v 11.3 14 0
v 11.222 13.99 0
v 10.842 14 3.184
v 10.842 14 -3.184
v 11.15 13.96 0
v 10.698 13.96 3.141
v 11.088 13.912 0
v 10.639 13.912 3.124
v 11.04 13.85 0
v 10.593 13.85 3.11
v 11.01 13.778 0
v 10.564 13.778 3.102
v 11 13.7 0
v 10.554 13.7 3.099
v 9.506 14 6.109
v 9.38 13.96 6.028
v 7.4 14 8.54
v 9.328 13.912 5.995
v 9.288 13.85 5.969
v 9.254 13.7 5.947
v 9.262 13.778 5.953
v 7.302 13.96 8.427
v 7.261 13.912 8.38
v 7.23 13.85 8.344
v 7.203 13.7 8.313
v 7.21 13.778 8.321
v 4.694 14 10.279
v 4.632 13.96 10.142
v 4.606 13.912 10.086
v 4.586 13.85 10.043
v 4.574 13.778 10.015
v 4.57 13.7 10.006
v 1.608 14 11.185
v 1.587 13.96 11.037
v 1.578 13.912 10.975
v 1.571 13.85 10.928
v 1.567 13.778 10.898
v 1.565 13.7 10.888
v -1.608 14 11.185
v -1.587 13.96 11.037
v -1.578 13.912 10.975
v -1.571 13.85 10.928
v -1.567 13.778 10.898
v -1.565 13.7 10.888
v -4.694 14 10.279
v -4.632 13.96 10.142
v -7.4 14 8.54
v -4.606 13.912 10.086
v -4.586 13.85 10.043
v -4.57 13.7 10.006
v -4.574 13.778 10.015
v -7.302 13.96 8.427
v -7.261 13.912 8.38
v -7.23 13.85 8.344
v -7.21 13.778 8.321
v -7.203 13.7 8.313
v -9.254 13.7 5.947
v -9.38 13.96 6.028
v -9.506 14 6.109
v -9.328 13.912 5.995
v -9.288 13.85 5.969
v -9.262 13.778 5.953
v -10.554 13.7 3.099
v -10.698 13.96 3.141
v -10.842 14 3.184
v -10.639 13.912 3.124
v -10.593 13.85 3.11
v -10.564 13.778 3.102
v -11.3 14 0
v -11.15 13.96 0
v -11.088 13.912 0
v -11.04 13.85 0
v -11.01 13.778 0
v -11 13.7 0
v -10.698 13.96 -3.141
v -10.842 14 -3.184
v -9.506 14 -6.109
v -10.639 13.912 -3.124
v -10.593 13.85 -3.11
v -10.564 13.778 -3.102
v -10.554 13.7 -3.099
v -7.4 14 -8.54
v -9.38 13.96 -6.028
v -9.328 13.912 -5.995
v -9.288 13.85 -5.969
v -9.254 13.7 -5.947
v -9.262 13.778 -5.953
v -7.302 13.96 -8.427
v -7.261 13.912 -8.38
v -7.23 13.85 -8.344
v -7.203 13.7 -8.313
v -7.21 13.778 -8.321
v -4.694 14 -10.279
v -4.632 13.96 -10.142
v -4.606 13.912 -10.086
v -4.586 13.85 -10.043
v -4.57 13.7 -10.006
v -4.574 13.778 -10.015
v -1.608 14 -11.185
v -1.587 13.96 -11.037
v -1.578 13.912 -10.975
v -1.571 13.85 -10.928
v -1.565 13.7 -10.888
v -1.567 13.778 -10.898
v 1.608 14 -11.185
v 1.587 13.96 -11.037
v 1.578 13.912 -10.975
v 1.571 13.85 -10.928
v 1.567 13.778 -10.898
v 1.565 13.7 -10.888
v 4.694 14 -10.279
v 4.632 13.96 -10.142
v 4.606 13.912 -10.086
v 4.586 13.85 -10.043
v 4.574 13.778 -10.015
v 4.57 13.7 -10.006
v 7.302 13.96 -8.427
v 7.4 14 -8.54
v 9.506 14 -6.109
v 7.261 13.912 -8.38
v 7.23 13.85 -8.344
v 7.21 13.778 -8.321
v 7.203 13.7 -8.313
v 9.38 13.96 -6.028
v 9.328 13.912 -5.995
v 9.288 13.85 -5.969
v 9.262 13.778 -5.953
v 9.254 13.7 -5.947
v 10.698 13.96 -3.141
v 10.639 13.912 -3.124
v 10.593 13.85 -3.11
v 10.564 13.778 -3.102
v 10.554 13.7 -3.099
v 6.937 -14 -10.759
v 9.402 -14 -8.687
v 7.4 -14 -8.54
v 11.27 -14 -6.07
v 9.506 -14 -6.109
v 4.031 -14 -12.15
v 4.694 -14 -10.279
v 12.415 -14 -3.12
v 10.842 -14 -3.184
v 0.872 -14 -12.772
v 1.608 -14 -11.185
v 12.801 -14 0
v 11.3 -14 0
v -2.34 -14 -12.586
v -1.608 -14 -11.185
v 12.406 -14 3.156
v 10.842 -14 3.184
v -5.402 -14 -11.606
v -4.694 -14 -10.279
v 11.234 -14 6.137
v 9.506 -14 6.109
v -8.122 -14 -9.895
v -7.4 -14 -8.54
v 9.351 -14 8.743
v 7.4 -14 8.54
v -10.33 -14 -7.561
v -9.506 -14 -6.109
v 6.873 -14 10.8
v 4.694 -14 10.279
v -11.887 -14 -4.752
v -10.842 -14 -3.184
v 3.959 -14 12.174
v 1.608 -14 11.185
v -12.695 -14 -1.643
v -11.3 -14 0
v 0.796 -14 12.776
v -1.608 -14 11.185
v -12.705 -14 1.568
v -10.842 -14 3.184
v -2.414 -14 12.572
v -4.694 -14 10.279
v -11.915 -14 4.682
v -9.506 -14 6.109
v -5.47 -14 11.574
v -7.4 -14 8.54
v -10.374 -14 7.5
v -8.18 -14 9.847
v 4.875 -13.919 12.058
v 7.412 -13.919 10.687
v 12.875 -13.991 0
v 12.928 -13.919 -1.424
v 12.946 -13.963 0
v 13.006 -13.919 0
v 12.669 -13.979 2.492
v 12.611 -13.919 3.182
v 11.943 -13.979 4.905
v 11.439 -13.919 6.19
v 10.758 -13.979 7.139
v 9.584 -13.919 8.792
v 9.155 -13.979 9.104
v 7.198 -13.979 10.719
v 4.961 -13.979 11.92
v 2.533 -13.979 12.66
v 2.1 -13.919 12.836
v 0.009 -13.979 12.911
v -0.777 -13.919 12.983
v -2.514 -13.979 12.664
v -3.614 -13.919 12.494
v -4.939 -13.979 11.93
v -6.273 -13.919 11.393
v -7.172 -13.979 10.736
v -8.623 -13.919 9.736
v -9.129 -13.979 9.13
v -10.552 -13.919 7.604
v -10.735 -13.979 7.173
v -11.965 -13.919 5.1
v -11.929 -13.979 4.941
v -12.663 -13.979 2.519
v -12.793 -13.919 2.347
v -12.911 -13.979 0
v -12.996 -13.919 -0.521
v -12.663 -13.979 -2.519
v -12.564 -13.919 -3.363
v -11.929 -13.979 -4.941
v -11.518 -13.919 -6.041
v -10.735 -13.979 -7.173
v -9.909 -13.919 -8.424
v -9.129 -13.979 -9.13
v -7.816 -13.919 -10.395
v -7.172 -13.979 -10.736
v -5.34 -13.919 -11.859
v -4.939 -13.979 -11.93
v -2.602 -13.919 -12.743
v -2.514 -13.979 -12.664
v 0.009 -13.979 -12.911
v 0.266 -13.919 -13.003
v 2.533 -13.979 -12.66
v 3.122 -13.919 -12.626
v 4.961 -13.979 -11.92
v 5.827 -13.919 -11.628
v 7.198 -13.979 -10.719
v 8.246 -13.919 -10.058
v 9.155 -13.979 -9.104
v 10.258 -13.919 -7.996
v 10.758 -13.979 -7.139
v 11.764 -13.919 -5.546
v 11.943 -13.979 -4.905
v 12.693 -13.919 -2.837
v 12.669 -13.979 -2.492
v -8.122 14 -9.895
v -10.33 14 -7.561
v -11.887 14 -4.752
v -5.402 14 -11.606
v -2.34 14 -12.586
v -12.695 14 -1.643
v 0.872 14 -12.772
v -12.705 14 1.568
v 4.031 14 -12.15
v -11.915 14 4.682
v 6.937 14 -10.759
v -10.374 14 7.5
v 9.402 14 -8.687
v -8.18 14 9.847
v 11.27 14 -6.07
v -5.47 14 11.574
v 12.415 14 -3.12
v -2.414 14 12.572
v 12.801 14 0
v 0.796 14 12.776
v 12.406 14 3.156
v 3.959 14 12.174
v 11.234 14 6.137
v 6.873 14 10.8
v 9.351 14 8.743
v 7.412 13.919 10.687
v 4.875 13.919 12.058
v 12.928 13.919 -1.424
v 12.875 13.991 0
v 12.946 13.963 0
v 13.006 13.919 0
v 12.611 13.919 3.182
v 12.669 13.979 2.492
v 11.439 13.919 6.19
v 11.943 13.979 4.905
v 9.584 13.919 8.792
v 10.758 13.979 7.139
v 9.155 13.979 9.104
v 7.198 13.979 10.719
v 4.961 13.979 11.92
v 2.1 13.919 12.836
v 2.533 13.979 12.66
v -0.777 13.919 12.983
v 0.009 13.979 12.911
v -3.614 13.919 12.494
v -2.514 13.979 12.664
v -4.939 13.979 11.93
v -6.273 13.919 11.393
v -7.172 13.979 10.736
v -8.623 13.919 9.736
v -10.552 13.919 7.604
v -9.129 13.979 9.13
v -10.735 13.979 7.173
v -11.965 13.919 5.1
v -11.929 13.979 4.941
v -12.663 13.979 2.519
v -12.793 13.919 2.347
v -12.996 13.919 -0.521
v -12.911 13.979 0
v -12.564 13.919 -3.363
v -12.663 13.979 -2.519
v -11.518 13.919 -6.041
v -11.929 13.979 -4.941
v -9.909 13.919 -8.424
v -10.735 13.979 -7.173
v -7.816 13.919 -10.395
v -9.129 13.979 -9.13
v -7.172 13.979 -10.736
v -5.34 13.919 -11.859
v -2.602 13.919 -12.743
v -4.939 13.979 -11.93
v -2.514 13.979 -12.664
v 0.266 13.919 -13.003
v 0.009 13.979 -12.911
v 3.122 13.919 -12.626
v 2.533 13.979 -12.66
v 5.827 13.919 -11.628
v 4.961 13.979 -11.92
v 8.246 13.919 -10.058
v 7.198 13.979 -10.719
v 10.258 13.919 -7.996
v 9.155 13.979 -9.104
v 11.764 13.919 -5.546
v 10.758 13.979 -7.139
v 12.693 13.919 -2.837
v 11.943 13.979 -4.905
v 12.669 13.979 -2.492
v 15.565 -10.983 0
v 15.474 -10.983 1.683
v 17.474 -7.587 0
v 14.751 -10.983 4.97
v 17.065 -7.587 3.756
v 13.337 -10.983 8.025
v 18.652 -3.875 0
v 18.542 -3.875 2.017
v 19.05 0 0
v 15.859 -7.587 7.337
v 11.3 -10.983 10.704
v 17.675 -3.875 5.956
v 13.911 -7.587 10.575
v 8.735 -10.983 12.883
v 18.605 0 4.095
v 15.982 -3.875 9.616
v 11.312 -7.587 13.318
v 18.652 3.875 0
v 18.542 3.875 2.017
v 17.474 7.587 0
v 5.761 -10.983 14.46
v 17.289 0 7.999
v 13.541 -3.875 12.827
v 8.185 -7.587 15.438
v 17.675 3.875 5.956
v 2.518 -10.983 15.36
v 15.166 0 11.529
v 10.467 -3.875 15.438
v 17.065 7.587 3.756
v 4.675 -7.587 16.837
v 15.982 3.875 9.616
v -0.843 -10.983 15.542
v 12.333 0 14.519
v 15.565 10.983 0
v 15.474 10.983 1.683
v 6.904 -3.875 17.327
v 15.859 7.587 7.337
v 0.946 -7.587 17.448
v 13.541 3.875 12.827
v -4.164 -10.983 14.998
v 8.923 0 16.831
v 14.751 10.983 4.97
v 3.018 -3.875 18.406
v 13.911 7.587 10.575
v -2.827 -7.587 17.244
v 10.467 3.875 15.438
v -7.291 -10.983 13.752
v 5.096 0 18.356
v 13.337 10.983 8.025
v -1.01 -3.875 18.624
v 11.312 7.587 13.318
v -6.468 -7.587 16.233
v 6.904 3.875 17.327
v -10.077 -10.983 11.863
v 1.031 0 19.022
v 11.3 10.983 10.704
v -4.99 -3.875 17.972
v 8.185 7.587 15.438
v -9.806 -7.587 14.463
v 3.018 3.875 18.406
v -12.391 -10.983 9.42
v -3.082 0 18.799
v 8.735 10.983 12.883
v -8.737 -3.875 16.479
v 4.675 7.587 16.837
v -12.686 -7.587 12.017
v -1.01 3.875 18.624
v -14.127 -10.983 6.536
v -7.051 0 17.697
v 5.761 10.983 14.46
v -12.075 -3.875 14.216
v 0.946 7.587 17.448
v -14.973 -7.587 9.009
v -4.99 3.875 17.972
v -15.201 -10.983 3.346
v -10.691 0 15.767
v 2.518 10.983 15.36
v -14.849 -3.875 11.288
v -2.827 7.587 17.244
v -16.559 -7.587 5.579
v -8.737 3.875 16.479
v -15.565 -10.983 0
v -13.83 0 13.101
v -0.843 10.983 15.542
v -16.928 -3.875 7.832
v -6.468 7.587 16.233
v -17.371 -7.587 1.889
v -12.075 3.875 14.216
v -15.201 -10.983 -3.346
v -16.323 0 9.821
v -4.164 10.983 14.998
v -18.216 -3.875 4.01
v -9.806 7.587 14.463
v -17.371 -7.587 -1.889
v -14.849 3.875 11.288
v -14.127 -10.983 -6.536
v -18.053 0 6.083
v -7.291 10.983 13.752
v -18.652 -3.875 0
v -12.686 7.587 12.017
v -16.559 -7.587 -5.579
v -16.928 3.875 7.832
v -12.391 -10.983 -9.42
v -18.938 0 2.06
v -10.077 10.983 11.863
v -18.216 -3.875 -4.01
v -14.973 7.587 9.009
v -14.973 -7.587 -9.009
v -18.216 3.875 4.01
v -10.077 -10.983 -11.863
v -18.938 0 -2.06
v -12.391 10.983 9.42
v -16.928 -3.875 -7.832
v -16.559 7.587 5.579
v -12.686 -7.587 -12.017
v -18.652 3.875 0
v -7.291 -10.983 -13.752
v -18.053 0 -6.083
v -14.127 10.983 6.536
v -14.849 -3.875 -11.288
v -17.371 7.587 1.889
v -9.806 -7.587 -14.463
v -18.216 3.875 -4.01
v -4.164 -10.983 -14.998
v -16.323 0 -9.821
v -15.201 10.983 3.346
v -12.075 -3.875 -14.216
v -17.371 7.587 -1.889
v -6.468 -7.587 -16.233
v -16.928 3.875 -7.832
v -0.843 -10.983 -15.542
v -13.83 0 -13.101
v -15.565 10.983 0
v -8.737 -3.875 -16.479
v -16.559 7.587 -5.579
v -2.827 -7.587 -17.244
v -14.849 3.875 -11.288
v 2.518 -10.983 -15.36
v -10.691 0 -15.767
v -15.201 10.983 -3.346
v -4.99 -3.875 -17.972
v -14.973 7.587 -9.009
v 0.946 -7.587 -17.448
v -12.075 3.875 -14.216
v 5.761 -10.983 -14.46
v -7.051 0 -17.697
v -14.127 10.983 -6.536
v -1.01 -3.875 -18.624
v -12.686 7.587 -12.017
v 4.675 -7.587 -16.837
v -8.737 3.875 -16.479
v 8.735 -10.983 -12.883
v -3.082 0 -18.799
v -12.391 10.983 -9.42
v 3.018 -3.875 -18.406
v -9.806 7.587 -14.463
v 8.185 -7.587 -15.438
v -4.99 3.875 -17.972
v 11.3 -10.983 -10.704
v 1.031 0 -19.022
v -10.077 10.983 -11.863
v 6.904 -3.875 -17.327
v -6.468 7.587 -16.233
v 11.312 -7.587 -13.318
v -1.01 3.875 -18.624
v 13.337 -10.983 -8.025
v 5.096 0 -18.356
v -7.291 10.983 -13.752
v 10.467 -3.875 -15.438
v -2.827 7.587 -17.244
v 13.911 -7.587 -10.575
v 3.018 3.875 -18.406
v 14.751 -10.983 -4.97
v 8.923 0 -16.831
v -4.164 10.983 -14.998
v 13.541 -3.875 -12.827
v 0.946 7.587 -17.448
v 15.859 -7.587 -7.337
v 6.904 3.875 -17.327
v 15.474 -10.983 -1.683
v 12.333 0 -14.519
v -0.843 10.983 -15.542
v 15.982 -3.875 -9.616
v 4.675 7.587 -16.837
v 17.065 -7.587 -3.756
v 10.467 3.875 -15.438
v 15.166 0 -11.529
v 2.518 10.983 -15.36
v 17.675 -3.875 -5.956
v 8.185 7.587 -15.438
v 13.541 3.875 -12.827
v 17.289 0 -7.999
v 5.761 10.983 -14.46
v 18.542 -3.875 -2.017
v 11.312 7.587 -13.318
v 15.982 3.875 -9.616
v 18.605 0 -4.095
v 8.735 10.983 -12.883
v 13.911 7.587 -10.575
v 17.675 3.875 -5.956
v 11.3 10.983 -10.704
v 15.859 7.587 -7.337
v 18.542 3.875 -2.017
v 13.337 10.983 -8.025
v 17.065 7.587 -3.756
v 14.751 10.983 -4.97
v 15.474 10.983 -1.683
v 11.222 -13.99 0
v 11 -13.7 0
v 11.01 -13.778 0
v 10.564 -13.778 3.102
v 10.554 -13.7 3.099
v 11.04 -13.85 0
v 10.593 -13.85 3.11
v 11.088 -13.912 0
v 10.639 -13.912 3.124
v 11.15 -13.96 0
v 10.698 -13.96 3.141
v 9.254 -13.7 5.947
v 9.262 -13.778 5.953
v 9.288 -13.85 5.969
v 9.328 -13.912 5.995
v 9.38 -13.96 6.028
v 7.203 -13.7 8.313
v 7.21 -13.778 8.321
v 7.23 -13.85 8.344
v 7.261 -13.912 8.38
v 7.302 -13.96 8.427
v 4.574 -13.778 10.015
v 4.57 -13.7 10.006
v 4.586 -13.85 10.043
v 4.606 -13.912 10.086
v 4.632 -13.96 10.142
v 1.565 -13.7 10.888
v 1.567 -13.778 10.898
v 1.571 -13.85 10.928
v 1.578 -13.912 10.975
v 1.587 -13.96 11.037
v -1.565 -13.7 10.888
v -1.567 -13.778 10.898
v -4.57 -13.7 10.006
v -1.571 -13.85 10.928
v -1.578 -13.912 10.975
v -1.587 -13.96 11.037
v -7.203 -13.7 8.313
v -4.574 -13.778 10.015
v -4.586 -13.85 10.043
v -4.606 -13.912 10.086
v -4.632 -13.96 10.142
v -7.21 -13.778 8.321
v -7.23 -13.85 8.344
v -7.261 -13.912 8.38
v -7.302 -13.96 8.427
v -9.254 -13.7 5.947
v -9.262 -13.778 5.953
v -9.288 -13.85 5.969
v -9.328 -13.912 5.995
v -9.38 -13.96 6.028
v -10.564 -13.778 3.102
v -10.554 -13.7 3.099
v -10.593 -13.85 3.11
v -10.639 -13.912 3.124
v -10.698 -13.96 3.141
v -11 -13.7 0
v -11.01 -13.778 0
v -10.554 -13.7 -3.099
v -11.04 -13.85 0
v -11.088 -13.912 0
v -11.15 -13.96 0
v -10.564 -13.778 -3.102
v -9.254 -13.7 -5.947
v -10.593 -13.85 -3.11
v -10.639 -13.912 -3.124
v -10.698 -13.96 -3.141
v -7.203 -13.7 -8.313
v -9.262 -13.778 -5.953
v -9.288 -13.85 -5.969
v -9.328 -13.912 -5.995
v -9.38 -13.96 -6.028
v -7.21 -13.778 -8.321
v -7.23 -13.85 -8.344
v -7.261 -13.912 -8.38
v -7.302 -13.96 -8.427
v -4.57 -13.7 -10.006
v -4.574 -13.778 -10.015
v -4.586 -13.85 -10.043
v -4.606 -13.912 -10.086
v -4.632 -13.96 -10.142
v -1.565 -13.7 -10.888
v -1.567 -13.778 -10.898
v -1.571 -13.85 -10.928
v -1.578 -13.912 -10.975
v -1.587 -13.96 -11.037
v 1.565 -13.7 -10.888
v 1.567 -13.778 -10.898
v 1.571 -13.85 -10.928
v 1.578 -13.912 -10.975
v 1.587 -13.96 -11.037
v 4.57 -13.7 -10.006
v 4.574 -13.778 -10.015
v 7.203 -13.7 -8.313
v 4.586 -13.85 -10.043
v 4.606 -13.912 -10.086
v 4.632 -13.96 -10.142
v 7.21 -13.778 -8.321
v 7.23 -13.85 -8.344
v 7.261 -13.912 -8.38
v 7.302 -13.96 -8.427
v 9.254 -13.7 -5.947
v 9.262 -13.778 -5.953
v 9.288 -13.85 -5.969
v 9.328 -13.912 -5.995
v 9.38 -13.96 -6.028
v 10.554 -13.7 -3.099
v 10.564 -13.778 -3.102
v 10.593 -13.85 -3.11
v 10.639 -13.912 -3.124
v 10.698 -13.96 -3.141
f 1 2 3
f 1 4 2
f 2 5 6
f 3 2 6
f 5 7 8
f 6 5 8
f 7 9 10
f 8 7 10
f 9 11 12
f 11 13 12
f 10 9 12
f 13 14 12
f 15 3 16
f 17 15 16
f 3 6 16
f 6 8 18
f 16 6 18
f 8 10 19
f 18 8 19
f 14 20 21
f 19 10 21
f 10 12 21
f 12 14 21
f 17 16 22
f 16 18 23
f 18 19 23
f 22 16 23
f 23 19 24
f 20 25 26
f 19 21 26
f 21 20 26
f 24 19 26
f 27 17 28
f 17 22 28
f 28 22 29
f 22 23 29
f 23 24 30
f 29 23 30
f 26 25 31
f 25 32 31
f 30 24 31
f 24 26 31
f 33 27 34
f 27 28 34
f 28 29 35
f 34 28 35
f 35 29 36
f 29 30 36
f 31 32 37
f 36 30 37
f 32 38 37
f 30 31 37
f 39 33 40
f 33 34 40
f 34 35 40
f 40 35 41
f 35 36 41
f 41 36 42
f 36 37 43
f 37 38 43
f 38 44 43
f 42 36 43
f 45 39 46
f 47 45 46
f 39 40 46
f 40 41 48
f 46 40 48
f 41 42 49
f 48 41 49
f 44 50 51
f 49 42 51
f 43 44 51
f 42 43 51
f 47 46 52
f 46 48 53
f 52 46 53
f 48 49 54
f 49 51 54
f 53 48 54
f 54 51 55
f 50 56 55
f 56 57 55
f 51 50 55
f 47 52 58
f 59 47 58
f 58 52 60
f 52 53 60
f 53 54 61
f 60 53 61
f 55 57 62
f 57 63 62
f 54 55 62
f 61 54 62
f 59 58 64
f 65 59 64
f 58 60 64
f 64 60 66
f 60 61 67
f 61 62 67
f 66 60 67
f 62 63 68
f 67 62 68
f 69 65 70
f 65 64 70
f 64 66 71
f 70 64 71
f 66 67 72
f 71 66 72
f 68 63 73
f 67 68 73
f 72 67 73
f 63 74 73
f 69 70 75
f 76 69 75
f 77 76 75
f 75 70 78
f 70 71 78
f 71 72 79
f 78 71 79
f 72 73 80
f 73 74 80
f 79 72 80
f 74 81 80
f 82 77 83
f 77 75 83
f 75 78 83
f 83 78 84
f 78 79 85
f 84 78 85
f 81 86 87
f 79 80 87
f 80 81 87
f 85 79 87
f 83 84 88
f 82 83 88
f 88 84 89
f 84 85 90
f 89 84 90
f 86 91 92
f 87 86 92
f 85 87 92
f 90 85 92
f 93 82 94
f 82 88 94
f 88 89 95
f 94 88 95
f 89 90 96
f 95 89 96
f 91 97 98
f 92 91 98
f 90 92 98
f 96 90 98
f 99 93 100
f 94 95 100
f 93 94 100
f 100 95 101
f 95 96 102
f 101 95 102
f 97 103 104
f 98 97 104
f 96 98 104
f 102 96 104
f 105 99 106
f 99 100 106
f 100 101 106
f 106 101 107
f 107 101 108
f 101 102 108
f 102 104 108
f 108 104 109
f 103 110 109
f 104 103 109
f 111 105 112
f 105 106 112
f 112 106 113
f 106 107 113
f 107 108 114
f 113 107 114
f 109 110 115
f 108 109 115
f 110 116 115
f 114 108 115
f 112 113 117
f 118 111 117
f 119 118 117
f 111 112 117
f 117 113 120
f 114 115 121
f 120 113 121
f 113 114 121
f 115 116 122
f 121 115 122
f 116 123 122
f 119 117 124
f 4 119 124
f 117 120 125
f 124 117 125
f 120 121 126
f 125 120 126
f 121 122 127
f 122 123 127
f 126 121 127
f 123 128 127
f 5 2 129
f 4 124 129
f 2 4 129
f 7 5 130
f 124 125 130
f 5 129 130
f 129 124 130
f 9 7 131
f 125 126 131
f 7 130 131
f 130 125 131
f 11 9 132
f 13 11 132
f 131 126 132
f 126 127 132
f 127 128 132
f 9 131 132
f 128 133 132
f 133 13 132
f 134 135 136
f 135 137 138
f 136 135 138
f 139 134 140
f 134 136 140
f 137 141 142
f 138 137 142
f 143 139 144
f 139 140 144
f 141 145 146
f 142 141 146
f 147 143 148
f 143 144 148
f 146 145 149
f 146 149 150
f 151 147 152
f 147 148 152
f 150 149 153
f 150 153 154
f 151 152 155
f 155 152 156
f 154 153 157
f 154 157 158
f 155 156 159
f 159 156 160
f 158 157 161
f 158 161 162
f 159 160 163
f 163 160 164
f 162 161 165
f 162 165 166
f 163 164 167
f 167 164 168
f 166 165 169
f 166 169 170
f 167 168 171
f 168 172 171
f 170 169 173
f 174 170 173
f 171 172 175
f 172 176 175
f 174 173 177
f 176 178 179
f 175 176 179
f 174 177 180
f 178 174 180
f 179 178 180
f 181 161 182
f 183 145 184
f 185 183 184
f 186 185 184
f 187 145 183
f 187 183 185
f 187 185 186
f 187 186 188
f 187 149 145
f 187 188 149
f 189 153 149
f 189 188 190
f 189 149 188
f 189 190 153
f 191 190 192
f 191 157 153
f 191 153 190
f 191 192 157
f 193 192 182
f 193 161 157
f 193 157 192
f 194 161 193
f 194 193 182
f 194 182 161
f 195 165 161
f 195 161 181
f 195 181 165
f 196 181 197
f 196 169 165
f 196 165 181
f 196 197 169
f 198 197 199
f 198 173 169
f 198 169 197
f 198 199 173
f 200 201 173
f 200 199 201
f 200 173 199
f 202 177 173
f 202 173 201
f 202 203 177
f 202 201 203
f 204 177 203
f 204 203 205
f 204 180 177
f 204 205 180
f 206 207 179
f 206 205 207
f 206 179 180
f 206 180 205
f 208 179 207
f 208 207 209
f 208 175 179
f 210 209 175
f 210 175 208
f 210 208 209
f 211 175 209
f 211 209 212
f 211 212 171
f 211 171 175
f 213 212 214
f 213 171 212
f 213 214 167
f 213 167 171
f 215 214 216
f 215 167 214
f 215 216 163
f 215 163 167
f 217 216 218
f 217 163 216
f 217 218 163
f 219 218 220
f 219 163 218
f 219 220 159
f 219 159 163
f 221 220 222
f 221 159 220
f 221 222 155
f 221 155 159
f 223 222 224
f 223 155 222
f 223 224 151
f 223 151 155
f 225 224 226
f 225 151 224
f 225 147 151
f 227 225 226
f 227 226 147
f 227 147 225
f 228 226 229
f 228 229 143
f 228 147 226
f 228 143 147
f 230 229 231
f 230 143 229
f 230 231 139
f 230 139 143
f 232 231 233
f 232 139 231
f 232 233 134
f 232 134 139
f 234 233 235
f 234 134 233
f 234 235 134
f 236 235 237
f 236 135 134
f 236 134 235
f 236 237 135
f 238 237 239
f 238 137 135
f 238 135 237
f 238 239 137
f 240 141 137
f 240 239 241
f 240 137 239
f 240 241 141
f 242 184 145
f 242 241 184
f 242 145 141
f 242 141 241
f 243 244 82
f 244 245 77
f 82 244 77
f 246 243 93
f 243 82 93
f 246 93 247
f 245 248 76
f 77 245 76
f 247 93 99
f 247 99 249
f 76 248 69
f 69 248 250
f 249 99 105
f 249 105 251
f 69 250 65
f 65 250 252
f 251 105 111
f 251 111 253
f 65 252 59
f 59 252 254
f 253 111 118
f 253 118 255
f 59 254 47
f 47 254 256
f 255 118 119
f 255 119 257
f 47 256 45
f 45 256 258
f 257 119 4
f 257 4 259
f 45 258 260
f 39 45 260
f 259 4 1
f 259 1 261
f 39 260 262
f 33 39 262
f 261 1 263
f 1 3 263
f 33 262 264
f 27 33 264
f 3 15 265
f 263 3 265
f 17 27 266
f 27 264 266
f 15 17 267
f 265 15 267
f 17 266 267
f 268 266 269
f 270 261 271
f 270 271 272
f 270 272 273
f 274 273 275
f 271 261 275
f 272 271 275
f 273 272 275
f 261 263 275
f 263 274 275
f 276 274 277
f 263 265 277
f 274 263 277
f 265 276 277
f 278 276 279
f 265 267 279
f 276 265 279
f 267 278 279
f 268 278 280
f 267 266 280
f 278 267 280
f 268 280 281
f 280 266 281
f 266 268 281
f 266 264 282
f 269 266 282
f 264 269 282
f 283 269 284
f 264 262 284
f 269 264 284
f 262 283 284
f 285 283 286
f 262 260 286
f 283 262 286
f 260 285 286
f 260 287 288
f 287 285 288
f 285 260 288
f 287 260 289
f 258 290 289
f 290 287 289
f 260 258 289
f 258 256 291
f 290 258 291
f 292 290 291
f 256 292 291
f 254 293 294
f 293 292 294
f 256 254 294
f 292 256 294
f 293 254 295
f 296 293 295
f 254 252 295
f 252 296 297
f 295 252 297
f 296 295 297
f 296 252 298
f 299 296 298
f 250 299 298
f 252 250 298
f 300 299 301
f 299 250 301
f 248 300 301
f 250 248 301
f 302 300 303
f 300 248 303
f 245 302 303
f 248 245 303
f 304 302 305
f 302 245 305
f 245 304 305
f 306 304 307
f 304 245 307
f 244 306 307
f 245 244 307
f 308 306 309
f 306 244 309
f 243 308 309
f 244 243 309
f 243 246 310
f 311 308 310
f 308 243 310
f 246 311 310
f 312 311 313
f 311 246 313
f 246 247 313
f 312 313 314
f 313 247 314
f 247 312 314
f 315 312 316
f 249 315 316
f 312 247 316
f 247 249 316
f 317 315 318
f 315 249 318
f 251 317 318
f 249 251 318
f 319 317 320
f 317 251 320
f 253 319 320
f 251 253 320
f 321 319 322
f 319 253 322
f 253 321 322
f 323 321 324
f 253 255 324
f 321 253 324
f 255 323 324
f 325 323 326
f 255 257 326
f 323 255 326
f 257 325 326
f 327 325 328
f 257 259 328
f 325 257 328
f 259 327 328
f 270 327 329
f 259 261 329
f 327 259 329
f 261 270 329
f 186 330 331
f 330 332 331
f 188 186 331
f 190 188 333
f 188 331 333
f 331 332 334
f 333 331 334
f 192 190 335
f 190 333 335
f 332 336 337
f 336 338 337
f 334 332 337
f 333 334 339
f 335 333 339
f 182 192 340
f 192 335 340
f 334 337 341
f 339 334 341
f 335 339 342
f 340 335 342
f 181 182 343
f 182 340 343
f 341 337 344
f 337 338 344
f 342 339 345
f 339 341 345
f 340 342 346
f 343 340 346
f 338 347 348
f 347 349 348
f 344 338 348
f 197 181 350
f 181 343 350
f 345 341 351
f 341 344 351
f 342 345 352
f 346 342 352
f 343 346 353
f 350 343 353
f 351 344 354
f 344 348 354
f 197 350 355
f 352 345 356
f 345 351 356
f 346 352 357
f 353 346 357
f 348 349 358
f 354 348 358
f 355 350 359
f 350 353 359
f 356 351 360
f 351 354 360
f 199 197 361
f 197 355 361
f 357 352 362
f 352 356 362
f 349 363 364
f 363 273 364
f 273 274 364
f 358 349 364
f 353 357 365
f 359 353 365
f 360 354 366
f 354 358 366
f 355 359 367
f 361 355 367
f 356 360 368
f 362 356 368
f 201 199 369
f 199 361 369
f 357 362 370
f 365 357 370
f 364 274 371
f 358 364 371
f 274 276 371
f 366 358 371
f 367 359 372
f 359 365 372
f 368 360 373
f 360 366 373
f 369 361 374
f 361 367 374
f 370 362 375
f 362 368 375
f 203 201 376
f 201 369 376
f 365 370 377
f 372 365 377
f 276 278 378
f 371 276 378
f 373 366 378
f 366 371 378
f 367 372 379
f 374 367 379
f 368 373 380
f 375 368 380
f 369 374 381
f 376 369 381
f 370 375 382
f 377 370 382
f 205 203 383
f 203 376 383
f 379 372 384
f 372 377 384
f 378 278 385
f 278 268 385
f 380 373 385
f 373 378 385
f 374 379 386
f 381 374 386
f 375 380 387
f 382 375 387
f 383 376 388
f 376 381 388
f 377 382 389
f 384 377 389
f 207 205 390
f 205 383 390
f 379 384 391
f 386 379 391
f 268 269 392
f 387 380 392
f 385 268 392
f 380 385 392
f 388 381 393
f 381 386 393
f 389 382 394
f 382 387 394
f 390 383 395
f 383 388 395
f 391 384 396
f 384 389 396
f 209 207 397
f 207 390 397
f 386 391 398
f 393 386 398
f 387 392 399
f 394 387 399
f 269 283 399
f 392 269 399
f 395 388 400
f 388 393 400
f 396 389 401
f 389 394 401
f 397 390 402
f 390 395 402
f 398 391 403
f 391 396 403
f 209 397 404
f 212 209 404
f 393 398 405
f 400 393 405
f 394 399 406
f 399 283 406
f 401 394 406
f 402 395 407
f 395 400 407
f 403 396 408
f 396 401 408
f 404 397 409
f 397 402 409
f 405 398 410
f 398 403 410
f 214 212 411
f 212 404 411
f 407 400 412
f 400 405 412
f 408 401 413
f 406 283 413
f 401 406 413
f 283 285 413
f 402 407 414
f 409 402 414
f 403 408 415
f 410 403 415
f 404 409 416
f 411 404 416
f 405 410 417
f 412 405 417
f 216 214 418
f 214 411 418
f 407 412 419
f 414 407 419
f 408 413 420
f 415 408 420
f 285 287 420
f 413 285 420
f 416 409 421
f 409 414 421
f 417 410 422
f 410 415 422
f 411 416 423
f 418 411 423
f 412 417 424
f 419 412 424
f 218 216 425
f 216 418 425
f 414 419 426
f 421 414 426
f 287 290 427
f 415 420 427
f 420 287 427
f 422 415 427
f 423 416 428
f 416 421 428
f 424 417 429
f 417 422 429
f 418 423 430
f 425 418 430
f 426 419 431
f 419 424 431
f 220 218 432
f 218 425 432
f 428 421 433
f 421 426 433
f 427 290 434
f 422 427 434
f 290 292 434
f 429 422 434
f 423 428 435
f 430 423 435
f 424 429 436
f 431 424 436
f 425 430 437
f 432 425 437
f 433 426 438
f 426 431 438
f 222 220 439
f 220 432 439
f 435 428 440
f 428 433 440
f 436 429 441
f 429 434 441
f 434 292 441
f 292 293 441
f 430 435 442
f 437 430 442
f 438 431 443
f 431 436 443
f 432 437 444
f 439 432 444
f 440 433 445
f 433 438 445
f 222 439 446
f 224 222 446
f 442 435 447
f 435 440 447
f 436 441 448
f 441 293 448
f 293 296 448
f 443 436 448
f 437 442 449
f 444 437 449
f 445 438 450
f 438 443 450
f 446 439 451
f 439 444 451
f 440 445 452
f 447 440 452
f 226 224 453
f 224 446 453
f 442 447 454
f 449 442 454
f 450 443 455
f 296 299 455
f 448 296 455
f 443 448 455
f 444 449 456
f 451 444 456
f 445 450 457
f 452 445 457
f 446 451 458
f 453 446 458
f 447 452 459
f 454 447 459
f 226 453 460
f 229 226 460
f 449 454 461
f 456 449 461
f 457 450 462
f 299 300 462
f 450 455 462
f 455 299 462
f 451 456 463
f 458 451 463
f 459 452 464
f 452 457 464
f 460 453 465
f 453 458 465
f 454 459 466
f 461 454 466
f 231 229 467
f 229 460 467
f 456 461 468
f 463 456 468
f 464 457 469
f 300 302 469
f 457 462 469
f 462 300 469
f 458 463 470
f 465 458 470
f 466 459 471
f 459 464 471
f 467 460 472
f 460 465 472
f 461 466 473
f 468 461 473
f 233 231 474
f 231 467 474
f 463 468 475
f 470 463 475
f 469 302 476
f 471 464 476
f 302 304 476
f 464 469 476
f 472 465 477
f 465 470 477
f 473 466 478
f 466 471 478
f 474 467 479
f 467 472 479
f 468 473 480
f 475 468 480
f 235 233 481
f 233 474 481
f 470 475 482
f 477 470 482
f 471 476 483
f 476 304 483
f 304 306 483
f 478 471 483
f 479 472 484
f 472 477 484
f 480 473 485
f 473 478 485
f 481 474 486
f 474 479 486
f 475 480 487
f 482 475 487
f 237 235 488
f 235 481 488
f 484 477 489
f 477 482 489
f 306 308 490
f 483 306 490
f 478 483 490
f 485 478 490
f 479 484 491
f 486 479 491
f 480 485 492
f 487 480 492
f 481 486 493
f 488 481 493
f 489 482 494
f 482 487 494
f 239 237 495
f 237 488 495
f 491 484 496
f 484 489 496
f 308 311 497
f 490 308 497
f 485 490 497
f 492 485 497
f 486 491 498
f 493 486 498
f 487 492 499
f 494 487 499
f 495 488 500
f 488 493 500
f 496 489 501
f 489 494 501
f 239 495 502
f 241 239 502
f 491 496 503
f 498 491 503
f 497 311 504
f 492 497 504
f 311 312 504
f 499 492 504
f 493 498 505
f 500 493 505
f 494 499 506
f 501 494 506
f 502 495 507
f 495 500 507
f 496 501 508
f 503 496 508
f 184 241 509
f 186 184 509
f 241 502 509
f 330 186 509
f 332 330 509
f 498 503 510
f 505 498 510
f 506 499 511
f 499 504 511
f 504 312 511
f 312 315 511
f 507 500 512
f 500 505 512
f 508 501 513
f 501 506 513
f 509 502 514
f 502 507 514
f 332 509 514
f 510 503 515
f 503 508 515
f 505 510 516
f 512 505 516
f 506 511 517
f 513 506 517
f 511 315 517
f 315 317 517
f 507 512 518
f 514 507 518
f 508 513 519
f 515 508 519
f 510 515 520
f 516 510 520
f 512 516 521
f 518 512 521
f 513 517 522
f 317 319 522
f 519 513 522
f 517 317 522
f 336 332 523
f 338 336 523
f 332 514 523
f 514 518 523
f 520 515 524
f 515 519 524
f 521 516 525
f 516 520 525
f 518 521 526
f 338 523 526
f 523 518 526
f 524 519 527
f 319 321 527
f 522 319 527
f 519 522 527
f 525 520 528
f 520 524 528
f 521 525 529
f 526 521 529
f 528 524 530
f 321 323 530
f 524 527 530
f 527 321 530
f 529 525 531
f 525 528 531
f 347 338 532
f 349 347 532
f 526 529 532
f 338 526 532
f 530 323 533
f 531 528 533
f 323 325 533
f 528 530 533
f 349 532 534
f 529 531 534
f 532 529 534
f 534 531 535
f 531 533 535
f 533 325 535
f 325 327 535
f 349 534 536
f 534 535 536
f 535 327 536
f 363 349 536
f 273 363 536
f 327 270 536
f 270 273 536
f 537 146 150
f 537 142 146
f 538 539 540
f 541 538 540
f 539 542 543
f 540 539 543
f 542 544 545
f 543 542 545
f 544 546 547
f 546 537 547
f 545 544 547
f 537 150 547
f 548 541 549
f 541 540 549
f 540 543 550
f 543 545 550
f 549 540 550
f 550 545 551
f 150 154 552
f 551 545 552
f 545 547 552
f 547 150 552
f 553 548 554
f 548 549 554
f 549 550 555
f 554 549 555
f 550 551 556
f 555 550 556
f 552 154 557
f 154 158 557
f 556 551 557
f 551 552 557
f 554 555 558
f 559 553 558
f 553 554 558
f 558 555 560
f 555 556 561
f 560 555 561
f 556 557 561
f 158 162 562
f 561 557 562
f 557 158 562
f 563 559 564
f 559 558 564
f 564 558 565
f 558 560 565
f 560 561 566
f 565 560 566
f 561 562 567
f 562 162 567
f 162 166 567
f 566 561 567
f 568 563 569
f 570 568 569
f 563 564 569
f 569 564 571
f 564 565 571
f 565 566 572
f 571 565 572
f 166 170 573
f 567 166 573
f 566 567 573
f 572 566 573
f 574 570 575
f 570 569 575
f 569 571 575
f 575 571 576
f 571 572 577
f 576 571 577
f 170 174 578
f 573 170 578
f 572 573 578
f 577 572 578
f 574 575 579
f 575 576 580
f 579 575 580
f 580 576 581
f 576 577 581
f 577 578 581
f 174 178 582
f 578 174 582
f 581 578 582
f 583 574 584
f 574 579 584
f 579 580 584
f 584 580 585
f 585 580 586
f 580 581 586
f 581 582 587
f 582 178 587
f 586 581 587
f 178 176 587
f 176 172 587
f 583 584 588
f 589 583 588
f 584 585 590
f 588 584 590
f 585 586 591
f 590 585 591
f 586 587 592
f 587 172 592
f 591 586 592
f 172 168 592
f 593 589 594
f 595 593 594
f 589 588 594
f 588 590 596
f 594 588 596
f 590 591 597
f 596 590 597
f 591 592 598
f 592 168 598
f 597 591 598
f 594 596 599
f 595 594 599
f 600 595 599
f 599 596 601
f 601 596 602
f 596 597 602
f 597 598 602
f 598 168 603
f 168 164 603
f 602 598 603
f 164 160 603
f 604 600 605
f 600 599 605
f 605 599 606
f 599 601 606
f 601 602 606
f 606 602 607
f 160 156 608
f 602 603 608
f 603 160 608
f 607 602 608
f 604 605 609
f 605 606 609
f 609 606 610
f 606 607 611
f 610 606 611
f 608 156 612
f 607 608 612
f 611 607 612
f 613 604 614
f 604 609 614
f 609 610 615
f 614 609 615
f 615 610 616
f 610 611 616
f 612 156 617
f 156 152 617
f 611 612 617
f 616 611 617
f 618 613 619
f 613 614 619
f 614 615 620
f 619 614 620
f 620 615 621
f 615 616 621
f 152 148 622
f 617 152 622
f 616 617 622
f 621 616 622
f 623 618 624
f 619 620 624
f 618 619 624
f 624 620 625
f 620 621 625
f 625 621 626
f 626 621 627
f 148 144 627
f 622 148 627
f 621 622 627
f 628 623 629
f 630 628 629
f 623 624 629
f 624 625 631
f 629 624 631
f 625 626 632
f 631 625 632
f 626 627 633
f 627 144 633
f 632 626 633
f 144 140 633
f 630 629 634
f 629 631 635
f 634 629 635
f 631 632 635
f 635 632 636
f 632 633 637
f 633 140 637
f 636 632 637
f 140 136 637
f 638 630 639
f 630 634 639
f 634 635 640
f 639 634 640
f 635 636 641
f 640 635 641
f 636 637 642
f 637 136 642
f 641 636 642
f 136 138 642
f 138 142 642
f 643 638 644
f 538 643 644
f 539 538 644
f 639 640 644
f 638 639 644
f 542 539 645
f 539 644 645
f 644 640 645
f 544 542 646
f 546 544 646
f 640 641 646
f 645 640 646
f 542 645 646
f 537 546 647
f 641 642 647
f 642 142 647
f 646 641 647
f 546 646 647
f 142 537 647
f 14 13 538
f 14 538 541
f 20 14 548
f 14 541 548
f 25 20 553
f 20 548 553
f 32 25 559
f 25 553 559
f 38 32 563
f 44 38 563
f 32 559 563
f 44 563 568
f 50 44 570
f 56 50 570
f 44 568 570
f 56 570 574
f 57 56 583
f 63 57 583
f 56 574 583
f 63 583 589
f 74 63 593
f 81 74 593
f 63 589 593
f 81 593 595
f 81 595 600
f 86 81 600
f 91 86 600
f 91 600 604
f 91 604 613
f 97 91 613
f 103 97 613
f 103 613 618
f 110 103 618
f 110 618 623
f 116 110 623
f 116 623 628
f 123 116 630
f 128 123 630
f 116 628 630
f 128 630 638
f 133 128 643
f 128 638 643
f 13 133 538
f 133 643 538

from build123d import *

# Parameters (mm, degrees)
FILLET1_R = 0.3


with BuildPart() as part:
    # Sketch1 → Revolve1 (revolve)
    with BuildSketch(Plane.XY):
        with BuildLine():
            Line((12.919075044, 14), (11, 14))
            Line((11, 14), (11, -14))
            Line((11, -14), (12.919075044, -14))
            ThreePointArc((12.919075044, -14), (19.05, 0), (12.919075044, 14))
        make_face()
    revolve(axis=Axis((0, 14, 0), (0, -1, 0)))

    # Fillet1
    fillet1_edges = [part.edges().sort_by_distance(p)[0] for p in [
        (-12.919075044, -14, 0),
        (-11, -14, 0),
        (-11, 14, 0),
        (-12.919075044, 14, 0),
    ]]
    fillet(fillet1_edges, radius=FILLET1_R)


solid = part.part
